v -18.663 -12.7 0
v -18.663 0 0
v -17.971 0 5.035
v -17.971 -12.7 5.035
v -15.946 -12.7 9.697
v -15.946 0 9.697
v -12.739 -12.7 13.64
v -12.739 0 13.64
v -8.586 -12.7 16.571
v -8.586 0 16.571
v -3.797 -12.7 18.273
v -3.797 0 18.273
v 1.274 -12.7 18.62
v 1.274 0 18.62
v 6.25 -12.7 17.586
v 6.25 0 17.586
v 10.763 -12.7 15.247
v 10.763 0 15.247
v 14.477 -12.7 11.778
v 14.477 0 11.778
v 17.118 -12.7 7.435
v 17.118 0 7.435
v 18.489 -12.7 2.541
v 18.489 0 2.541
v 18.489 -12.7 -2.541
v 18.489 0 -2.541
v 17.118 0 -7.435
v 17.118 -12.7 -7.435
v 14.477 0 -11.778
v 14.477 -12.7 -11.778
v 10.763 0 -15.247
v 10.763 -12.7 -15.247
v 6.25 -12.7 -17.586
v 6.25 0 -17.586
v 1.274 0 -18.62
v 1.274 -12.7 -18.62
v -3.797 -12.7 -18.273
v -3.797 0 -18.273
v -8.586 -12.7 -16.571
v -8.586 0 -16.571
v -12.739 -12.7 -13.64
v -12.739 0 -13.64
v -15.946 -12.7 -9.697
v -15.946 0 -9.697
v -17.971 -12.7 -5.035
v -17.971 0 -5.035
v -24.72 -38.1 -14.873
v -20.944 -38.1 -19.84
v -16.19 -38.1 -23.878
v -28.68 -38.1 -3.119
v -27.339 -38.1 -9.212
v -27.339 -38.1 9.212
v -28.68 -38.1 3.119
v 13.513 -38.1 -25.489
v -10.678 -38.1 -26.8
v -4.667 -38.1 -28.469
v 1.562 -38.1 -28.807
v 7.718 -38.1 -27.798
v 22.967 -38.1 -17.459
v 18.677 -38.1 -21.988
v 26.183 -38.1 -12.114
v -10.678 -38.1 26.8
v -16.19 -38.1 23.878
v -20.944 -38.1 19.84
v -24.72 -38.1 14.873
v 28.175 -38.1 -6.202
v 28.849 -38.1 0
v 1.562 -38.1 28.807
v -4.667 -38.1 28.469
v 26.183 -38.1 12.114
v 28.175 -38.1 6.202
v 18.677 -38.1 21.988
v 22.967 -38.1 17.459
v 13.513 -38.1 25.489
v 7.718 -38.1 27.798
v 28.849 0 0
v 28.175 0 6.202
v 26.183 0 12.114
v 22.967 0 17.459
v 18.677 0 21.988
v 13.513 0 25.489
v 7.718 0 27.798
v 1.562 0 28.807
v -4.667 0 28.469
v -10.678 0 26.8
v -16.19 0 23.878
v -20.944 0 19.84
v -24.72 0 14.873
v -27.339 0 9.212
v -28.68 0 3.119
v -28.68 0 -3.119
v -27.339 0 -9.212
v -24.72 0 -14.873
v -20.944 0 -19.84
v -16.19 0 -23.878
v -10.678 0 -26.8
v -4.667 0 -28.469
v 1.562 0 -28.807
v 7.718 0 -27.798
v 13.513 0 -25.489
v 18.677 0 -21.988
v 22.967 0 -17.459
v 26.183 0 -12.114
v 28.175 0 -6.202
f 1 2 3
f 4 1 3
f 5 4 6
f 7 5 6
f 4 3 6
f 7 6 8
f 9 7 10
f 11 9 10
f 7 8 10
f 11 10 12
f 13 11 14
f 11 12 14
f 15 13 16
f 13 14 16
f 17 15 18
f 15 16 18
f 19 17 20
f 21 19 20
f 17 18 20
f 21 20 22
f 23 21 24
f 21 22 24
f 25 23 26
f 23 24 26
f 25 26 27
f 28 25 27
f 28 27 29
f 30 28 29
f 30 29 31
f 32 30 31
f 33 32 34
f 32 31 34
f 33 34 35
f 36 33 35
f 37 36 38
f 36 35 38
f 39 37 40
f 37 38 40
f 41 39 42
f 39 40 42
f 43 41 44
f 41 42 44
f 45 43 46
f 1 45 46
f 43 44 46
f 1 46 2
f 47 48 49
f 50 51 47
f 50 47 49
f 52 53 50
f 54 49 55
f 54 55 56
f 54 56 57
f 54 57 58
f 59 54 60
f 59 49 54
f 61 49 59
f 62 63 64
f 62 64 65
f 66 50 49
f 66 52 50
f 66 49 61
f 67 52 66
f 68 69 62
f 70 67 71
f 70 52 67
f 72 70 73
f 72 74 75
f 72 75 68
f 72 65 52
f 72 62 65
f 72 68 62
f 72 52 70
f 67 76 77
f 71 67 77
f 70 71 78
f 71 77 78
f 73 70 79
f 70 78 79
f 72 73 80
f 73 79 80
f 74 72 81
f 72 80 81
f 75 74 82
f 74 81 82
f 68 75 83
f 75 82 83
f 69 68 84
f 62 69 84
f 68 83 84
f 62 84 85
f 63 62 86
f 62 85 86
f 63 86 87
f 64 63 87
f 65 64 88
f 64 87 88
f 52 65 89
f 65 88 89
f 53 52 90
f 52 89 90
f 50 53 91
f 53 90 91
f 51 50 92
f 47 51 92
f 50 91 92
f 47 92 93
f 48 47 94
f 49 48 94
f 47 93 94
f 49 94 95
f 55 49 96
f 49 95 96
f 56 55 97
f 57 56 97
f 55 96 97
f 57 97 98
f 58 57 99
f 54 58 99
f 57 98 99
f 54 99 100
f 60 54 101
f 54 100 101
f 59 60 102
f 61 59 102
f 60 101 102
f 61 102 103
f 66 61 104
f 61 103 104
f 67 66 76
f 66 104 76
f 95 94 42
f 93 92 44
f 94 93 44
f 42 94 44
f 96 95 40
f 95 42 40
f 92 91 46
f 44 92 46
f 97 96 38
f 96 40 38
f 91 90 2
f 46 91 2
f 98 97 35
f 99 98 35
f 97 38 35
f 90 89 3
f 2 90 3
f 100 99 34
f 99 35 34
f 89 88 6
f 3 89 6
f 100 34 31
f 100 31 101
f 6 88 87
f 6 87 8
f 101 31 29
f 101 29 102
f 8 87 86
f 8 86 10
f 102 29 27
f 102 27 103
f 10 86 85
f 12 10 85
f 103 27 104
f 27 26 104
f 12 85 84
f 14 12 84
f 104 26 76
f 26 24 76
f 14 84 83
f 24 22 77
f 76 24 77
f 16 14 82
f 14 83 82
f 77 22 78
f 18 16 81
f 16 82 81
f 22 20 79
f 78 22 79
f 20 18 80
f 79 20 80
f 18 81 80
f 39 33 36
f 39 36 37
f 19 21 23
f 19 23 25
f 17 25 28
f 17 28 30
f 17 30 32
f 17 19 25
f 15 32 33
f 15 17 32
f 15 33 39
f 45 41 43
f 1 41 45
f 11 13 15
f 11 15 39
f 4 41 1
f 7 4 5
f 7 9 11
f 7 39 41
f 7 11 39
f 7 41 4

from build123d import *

# Parameters (mm, degrees)
F0_R       = 18.6431523729
F1_DEPTH   = 11.43
F2_R       = 28.8493495365
F3_DEPTH   = 38.1
F4_R       = 18.663241222
F3_FACE1_R = 28.8493495365
F5_DEPTH   = 12.7


with BuildPart() as f1:
    # F0 (on Front) → F1 (new body)
    with BuildSketch(Plane.XZ):
        Circle(F0_R)
    extrude(amount=F1_DEPTH)

    # F2 (on Front) → F3 (join)
    with BuildSketch(Plane.XZ):
        Circle(F2_R)
    extrude(amount=F3_DEPTH)

    # F4 (on face) + F3_face1 (on face) → F5 (cut)
    with BuildSketch(Plane(origin=(0, 0, 0), x_dir=(-1, 0, 0), z_dir=(0, 1, 0))):
        Circle(F4_R)
    with BuildSketch(Plane.XZ.offset(38.1)):
        Circle(F3_FACE1_R)
    extrude(amount=-F5_DEPTH, dir=(0, 1, 0), mode=Mode.SUBTRACT)


solid = f1.part
